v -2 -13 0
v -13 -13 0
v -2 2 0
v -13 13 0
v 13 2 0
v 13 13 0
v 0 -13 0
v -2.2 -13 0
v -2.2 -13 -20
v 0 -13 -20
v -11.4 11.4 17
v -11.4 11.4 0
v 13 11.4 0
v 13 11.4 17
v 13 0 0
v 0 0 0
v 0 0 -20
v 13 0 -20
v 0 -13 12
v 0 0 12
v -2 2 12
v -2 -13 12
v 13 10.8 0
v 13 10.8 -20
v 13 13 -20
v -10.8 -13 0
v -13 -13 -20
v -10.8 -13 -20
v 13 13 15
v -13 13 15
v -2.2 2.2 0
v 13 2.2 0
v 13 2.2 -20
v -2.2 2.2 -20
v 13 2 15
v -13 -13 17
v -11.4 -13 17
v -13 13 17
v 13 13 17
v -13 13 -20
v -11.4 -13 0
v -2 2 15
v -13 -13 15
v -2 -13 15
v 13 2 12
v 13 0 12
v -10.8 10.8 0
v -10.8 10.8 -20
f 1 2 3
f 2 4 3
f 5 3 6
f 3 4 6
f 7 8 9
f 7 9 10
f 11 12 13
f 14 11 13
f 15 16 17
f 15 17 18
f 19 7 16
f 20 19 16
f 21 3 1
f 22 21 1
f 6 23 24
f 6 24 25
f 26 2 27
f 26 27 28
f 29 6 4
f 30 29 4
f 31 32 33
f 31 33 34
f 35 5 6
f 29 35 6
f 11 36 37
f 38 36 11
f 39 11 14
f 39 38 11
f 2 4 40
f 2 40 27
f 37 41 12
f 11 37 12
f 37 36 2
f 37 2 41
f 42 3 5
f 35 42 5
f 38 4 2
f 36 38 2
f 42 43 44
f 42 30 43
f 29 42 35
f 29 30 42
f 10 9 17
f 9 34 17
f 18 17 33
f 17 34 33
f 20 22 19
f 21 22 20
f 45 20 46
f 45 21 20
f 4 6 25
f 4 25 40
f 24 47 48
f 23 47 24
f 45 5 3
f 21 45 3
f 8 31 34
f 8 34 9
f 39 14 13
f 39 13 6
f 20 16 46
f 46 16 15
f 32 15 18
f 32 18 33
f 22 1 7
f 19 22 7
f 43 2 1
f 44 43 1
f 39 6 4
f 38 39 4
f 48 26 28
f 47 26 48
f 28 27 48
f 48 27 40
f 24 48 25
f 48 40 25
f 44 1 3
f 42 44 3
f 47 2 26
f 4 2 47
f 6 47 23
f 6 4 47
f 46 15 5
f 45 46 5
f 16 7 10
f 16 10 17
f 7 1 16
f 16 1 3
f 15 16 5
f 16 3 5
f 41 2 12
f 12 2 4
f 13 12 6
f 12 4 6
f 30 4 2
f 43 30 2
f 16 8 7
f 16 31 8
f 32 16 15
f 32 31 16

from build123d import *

# Parameters (mm, degrees)
F1_DEPTH = 20
F2_DEPTH = 12
F3_DEPTH = 17
F4_DEPTH = 15


with BuildPart() as f1:
    # F0 (on Top) → F1 (new body)
    with BuildSketch(Plane.XY):
        Polygon((-13, -13), (-11.4, -13), (-11.4, 0), (-11.4, 11.4), (0, 11.4), (13, 11.4), (13, 13), (0, 13), (-13, 13), (-13, 0), align=None)
        Polygon((-2.2, -13), (-2, -13), (-2, 2), (13, 2), (13, 2.2), (-2.2, 2.2), align=None)
        Polygon((-2, -13), (0, -13), (0, 0), (13, 0), (13, 2), (-2, 2), align=None)
        Polygon((-11.4, -13), (-10.8, -13), (-10.8, 0), (-10.8, 10.8), (0, 10.8), (13, 10.8), (13, 11.4), (0, 11.4), (-11.4, 11.4), (-11.4, 0), align=None)
    extrude(amount=-F1_DEPTH)


with BuildPart() as f2:
    # F0 (on Top) → F2 (new body)
    with BuildSketch(Plane.XY):
        Polygon((-2, -13), (0, -13), (0, 0), (13, 0), (13, 2), (-2, 2), align=None)
    extrude(amount=F2_DEPTH)


with BuildPart() as f3:
    # F0 (on Top) → F3 (new body)
    with BuildSketch(Plane.XY):
        Polygon((-13, -13), (-11.4, -13), (-11.4, 0), (-11.4, 11.4), (0, 11.4), (13, 11.4), (13, 13), (0, 13), (-13, 13), (-13, 0), align=None)
    extrude(amount=F3_DEPTH)


with BuildPart() as f4:
    # F0 (on Top) → F4 (new body)
    with BuildSketch(Plane.XY):
        Polygon((-13, -13), (-11.4, -13), (-11.4, 0), (-11.4, 11.4), (0, 11.4), (13, 11.4), (13, 13), (0, 13), (-13, 13), (-13, 0), align=None)
        Polygon((-11.4, -13), (-10.8, -13), (-10.8, 0), (-10.8, 10.8), (0, 10.8), (13, 10.8), (13, 11.4), (0, 11.4), (-11.4, 11.4), (-11.4, 0), align=None)
        Polygon((-10.8, -13), (-2.2, -13), (-2.2, 2.2), (13, 2.2), (13, 10.8), (0, 10.8), (-10.8, 10.8), (-10.8, 0), align=None)
        Polygon((-2.2, -13), (-2, -13), (-2, 2), (13, 2), (13, 2.2), (-2.2, 2.2), align=None)
    extrude(amount=F4_DEPTH)


solid = Compound([f1.part, f2.part, f3.part, f4.part])
